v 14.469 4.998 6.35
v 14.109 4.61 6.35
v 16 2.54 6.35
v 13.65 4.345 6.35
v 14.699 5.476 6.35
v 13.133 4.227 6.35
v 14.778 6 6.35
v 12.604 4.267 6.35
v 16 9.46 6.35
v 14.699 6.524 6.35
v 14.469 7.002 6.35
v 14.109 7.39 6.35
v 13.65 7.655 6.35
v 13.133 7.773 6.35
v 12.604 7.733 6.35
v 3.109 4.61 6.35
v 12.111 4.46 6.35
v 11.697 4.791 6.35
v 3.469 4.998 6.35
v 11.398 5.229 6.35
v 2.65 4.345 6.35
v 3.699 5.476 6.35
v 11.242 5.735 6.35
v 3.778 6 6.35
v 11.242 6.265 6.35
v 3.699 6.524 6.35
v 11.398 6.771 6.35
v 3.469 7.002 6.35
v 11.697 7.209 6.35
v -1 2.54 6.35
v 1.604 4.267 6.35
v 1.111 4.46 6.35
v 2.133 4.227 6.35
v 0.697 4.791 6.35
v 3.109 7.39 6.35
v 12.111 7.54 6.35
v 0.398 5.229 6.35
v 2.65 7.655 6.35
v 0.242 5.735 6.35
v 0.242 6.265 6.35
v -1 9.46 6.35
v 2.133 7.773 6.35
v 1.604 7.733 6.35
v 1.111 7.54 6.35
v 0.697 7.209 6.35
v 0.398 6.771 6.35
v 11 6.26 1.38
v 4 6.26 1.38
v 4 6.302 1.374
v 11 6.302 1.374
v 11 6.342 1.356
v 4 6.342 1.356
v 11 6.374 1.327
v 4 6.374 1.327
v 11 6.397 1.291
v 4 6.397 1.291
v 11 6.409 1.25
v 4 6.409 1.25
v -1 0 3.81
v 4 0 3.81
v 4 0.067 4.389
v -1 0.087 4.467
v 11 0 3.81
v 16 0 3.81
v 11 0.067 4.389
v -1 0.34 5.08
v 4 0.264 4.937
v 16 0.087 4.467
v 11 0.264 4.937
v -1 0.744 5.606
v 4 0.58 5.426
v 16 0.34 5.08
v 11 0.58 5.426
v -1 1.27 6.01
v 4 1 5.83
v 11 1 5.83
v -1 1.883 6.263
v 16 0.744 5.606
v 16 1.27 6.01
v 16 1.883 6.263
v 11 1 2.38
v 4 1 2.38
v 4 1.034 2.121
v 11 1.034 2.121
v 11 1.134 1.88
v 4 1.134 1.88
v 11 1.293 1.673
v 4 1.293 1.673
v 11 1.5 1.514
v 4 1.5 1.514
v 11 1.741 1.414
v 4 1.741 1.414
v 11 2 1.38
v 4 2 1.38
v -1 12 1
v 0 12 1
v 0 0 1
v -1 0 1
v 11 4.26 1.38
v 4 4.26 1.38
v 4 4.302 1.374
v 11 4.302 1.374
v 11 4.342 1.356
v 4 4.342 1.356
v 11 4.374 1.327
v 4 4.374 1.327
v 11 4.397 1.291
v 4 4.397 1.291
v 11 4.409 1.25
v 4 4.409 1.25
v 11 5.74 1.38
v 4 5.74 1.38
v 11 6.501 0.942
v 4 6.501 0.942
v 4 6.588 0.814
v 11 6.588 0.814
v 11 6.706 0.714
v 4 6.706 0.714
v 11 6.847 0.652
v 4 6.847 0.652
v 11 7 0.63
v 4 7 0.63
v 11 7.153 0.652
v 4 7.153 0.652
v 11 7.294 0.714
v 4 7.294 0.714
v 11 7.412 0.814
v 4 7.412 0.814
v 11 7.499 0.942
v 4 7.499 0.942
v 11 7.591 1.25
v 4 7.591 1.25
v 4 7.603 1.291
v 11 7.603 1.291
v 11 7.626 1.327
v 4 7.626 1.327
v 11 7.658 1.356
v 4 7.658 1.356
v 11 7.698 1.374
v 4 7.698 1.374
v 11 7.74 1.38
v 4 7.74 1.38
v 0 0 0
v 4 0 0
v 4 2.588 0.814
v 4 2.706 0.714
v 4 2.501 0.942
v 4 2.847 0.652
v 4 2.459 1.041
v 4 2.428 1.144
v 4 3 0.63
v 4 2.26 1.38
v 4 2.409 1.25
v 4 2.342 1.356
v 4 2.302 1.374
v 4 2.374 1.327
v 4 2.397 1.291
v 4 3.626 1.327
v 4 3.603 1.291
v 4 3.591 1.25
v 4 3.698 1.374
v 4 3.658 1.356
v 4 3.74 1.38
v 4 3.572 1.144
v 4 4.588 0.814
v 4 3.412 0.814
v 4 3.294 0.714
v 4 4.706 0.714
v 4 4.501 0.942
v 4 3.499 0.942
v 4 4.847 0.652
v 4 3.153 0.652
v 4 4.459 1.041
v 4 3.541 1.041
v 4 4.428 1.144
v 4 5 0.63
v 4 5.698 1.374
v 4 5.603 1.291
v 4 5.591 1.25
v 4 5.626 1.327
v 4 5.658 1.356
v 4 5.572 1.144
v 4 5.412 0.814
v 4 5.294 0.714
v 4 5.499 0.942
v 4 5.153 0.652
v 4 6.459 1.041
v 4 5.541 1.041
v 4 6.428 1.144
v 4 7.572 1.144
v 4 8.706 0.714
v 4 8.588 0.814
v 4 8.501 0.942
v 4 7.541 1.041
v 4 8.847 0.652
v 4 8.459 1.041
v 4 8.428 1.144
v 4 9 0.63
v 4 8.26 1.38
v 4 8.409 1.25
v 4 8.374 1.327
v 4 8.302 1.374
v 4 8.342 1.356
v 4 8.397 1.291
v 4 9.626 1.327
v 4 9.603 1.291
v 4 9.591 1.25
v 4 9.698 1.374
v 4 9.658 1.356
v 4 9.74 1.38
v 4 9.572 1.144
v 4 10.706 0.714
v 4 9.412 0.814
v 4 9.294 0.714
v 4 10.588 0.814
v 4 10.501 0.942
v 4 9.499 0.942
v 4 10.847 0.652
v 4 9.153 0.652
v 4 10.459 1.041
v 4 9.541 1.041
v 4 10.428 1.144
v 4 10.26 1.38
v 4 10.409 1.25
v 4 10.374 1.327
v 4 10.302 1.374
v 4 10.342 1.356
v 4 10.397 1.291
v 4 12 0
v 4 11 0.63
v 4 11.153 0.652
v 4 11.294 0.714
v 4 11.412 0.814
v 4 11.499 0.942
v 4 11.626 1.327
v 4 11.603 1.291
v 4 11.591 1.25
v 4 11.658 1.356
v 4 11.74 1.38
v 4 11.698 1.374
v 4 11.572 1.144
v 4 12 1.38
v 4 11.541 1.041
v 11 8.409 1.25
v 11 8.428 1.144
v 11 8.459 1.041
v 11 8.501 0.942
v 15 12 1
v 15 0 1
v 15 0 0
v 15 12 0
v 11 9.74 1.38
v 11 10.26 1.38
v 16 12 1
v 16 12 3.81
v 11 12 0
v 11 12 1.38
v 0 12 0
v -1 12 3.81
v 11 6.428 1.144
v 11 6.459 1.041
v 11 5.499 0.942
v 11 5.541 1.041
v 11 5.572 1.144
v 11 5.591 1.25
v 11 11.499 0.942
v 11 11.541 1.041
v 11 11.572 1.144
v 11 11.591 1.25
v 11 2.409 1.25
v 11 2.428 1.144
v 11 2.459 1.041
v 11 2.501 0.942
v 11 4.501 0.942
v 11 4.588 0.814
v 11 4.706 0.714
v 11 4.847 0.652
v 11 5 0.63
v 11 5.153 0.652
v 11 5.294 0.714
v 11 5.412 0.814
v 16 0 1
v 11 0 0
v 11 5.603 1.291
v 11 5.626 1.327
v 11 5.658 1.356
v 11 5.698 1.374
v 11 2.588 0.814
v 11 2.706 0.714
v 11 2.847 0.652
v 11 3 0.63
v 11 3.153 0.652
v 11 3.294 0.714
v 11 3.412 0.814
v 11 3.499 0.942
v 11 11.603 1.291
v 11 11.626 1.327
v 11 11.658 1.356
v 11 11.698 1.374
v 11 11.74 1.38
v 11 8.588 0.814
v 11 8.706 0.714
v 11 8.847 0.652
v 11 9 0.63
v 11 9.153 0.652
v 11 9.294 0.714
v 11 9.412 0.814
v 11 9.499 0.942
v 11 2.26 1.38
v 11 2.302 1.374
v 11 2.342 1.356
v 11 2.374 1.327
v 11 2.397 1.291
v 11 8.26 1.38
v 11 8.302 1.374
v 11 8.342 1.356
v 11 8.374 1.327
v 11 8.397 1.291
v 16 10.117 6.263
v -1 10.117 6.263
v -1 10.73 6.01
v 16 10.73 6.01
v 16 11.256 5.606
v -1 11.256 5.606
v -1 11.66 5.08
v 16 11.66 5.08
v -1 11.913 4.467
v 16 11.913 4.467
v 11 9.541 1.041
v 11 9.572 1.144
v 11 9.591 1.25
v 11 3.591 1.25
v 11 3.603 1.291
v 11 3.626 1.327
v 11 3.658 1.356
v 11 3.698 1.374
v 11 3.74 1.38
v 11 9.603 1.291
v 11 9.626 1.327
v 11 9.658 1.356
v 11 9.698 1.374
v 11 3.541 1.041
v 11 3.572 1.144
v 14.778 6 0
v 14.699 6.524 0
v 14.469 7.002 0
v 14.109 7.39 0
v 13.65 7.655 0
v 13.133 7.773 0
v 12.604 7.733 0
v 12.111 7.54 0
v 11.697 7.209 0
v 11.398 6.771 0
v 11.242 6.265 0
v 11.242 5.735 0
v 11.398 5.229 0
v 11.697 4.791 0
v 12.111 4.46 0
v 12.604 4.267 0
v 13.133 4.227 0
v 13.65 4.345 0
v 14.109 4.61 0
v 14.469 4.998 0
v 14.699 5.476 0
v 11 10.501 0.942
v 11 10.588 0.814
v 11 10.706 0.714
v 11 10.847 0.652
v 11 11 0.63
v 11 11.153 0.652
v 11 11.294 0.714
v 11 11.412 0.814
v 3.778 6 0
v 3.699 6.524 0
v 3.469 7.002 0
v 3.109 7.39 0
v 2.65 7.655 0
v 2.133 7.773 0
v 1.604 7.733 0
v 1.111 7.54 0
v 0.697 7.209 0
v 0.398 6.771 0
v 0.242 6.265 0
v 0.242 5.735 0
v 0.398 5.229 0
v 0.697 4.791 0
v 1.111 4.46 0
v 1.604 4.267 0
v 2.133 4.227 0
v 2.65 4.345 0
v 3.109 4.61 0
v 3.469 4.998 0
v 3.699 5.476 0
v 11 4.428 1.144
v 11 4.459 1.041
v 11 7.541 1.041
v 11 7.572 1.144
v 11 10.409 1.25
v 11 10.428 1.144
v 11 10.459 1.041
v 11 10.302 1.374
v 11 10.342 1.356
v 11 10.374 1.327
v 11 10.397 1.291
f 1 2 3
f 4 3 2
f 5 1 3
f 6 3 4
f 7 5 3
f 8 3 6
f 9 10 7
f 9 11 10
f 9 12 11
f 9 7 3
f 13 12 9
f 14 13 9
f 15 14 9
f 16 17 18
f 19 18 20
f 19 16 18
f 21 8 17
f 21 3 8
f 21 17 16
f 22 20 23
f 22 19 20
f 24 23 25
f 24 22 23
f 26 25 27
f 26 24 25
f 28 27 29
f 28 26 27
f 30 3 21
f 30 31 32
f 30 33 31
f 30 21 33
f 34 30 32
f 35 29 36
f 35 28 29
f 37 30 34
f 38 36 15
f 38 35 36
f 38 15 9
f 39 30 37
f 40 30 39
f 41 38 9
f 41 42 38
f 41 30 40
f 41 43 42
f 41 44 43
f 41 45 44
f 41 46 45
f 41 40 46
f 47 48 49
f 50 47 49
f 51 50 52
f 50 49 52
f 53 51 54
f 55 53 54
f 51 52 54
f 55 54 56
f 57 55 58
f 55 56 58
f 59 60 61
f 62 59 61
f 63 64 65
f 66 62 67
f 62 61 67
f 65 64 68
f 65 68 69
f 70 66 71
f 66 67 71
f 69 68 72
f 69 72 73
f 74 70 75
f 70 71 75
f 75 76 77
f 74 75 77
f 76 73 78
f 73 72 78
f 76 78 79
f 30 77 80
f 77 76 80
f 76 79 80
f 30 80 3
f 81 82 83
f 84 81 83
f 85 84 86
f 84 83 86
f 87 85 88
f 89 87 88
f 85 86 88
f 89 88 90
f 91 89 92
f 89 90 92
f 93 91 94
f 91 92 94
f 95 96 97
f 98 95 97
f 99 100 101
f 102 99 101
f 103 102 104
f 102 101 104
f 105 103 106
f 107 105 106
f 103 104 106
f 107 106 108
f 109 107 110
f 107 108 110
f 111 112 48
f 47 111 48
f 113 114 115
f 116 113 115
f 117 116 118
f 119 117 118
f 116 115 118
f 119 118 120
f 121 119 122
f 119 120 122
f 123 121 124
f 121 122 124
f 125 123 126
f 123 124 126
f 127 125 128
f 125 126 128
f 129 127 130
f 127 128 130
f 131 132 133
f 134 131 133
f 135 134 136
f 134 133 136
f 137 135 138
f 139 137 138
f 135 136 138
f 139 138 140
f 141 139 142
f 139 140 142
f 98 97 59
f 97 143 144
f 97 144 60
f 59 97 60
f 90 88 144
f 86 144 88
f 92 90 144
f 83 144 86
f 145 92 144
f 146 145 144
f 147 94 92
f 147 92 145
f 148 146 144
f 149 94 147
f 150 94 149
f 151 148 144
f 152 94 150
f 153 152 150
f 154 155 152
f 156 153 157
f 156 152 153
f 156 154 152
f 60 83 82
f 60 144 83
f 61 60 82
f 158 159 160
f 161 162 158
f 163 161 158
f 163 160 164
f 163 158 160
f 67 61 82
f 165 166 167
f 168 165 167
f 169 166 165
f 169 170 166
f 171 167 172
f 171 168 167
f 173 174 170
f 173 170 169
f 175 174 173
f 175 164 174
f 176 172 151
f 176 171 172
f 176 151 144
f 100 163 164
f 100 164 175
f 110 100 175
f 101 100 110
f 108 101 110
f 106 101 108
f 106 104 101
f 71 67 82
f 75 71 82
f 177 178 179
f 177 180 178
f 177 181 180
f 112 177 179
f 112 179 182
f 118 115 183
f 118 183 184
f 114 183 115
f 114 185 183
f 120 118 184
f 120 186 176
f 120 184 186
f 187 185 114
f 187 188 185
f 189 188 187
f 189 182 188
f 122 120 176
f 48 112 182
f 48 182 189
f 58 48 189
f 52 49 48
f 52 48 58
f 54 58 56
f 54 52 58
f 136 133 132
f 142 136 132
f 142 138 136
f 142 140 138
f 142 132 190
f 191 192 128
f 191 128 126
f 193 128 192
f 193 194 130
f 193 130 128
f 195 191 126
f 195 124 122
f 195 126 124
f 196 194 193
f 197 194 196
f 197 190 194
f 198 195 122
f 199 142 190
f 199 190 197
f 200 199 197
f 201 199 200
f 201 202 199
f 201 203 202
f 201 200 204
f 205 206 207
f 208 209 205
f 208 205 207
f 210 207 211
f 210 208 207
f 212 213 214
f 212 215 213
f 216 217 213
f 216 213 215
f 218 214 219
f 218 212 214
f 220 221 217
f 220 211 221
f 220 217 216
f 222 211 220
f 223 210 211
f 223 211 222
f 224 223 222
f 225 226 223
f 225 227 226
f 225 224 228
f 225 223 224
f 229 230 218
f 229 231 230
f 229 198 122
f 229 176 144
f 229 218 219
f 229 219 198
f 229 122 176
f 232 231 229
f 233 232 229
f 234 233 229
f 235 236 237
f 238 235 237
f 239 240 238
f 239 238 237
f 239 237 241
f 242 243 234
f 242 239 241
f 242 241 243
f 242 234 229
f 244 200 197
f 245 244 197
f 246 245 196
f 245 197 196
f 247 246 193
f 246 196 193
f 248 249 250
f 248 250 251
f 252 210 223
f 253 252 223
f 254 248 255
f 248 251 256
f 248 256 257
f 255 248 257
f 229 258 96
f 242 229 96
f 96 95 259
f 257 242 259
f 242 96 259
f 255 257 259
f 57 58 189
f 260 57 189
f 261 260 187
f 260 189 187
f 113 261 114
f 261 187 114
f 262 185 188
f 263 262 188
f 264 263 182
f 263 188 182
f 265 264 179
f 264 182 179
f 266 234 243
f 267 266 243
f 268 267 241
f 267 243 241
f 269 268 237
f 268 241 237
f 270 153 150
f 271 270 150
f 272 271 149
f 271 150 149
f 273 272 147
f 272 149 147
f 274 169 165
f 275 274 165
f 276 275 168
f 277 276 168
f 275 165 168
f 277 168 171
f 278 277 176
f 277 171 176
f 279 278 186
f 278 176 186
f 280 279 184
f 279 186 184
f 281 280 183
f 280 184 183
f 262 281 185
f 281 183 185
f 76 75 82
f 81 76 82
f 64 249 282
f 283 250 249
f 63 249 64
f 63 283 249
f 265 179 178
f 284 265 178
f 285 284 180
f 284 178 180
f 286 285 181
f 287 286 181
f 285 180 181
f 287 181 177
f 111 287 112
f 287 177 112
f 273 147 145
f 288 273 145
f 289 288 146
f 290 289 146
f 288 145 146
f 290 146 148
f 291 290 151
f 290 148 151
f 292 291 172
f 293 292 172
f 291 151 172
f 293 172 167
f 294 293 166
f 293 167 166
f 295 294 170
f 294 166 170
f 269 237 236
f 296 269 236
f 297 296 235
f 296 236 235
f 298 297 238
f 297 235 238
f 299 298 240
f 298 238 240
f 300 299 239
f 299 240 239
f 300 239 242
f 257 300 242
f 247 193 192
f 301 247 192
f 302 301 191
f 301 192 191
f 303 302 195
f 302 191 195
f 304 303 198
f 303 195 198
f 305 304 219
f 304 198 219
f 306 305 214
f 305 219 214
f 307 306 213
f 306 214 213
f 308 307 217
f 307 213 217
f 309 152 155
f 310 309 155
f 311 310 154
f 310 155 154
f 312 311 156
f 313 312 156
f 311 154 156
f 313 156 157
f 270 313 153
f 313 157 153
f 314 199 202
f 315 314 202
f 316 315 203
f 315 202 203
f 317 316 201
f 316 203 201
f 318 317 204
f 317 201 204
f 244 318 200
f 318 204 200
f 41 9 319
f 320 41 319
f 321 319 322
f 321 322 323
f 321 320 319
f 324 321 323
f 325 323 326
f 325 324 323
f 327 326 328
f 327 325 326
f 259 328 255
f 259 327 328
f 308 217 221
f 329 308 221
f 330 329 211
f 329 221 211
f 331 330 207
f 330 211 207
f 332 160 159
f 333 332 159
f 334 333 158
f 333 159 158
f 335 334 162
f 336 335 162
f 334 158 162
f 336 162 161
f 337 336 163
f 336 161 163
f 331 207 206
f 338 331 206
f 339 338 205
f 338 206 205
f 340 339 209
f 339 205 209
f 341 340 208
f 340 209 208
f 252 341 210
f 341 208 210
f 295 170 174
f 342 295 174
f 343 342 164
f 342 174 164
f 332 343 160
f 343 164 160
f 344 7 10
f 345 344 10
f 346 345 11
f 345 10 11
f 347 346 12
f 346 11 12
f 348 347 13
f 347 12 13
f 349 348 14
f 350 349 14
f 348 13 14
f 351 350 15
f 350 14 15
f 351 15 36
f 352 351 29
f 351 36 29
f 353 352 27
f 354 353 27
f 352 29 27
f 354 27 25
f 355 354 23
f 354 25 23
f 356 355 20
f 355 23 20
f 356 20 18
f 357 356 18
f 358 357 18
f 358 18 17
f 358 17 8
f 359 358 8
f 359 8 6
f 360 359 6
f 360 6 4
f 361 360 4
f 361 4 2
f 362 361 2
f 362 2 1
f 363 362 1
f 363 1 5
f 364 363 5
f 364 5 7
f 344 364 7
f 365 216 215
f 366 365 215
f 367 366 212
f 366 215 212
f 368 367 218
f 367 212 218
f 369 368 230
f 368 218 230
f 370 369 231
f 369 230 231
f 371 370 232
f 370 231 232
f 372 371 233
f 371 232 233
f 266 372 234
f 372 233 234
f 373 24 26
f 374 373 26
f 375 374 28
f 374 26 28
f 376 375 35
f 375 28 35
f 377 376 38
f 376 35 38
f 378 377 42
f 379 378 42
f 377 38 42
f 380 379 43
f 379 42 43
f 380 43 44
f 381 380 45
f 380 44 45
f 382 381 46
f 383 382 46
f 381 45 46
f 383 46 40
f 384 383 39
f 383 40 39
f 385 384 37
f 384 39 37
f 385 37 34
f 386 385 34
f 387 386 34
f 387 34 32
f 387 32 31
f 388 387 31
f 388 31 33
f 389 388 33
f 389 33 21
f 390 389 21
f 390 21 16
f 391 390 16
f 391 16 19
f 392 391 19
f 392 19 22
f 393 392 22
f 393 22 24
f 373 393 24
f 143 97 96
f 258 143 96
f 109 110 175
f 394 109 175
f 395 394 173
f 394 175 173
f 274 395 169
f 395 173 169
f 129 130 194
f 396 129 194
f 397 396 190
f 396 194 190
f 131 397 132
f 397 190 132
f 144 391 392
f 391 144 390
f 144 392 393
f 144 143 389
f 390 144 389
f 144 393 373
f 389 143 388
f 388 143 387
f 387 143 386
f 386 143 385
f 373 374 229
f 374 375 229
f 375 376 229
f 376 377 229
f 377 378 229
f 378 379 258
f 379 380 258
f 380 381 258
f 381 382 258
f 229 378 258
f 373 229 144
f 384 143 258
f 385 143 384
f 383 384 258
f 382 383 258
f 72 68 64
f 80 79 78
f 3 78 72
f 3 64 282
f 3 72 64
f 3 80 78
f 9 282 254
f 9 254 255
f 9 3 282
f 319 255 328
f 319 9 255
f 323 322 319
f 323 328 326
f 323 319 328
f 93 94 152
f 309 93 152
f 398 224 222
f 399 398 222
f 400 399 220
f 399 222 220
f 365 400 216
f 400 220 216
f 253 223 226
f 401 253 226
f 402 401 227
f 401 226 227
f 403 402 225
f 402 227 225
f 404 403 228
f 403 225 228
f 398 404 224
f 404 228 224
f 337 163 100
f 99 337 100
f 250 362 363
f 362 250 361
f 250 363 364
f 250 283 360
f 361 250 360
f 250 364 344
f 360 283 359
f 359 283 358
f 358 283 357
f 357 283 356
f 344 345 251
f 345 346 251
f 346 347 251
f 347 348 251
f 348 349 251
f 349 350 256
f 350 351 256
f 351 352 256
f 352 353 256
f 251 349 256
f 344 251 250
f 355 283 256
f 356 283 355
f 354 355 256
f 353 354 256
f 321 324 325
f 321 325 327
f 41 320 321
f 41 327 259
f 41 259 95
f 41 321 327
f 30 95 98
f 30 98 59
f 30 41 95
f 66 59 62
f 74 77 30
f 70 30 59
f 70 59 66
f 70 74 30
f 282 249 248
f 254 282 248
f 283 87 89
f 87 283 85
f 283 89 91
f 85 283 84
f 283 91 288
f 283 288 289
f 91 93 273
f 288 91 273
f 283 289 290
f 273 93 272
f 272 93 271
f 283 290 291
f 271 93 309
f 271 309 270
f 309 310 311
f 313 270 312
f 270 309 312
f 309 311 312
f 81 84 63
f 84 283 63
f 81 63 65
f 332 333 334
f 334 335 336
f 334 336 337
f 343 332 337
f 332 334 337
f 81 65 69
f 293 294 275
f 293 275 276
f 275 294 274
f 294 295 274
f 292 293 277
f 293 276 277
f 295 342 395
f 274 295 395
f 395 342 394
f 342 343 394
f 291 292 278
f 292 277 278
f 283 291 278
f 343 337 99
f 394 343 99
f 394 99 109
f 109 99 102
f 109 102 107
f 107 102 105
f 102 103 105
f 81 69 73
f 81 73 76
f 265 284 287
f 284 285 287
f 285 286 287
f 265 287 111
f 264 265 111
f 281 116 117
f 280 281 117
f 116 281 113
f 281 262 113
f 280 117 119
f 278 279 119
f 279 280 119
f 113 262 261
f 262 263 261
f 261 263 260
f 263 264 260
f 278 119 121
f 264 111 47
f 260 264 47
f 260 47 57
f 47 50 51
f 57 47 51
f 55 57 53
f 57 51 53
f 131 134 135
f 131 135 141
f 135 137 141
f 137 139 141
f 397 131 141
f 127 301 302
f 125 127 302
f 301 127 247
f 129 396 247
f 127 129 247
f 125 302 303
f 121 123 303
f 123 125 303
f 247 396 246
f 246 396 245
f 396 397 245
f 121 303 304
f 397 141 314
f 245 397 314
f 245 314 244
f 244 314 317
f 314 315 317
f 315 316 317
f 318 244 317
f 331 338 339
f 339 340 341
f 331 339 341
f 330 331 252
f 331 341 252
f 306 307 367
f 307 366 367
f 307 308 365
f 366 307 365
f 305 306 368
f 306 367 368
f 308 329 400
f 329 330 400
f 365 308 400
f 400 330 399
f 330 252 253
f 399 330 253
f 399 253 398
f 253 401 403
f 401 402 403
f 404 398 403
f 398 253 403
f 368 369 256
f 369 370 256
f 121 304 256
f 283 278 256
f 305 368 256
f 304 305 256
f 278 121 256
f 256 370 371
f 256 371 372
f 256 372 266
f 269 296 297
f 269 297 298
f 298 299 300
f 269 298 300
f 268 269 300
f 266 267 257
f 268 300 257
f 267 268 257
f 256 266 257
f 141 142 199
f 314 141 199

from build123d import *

# Parameters (mm, degrees)
F0_W      = 12
F0_H      = 6.35
F1_DEPTH  = 4
F3_DEPTH  = 7
F4_W      = 12
F4_H      = 6.35
F5_DEPTH  = 4
F6_R      = 1.778
F7_DEPTH  = 25.4
F8_W      = 12
F8_H      = 5.35
F9_DEPTH  = 1
F10_W     = 12
F10_H     = 5.35
F11_DEPTH = 1
F12_F1_R  = 2.54
F12_F2_R  = 2.54


with BuildPart() as f1:
    # F0 (on Right) → F1 (new body)
    with BuildSketch(Plane.YZ):
        with Locations((6, 3.175)):
            Rectangle(F0_W, F0_H)
    extrude(amount=F1_DEPTH)

    # F2 (on face) → F3 (join)
    with BuildSketch(Plane.YZ.offset(4)):
        with BuildLine():
            ThreePointArc((10.2598245749, 1.38), (10.3587316459, 1.3427714117), (10.4085431086, 1.2495652174))
            ThreePointArc((10.4085431086, 1.2495652174), (10.4423882857, 1.091937846), (10.5011235955, 0.9417977528))
            ThreePointArc((10.5011235955, 0.9417977528), (11, 0.63), (11.4988764045, 0.9417977528))
            ThreePointArc((11.4988764045, 0.9417977528), (11.5576117143, 1.091937846), (11.5914568914, 1.2495652174))
            ThreePointArc((11.5914568914, 1.2495652174), (11.6412683541, 1.3427714117), (11.7401754251, 1.38))
            Line((11.7401754251, 1.38), (12, 1.38))
            Line((12, 1.38), (12, 6.35))
            Line((12, 6.35), (1, 6.35))
            Line((1, 6.35), (1, 2.38))
            ThreePointArc((1, 2.38), (1.2928932188, 1.6728932188), (2, 1.38))
            Line((2, 1.38), (2.2598245749, 1.38))
            ThreePointArc((2.2598245749, 1.38), (2.3587316459, 1.3427714117), (2.4085431086, 1.2495652174))
            ThreePointArc((2.4085431086, 1.2495652174), (2.4423882857, 1.091937846), (2.5011235955, 0.9417977528))
            ThreePointArc((2.5011235955, 0.9417977528), (3, 0.63), (3.4988764045, 0.9417977528))
            ThreePointArc((3.4988764045, 0.9417977528), (3.5576117143, 1.091937846), (3.5914568914, 1.2495652174))
            ThreePointArc((3.5914568914, 1.2495652174), (3.6412683541, 1.3427714117), (3.7401754251, 1.38))
            Line((3.7401754251, 1.38), (4, 1.38))
            Line((4, 1.38), (4.2598245749, 1.38))
            ThreePointArc((4.2598245749, 1.38), (4.3587316459, 1.3427714117), (4.4085431086, 1.2495652174))
            ThreePointArc((4.4085431086, 1.2495652174), (4.4423882857, 1.091937846), (4.5011235955, 0.9417977528))
            ThreePointArc((4.5011235955, 0.9417977528), (5, 0.63), (5.4988764045, 0.9417977528))
            ThreePointArc((5.4988764045, 0.9417977528), (5.5576117143, 1.091937846), (5.5914568914, 1.2495652174))
            ThreePointArc((5.5914568914, 1.2495652174), (5.6412683541, 1.3427714117), (5.7401754251, 1.38))
            Line((5.7401754251, 1.38), (6, 1.38))
            Line((6, 1.38), (6.2598245749, 1.38))
            ThreePointArc((6.2598245749, 1.38), (6.3587316459, 1.3427714117), (6.4085431086, 1.2495652174))
            ThreePointArc((6.4085431086, 1.2495652174), (6.4423882857, 1.091937846), (6.5011235955, 0.9417977528))
            ThreePointArc((6.5011235955, 0.9417977528), (7, 0.63), (7.4988764045, 0.9417977528))
            ThreePointArc((7.4988764045, 0.9417977528), (7.5576117143, 1.091937846), (7.5914568914, 1.2495652174))
            ThreePointArc((7.5914568914, 1.2495652174), (7.6412683541, 1.3427714117), (7.7401754251, 1.38))
            Line((7.7401754251, 1.38), (8, 1.38))
            Line((8, 1.38), (8.2598245749, 1.38))
            ThreePointArc((8.2598245749, 1.38), (8.3587316459, 1.3427714117), (8.4085431086, 1.2495652174))
            ThreePointArc((8.4085431086, 1.2495652174), (8.4423882857, 1.091937846), (8.5011235955, 0.9417977528))
            ThreePointArc((8.5011235955, 0.9417977528), (9, 0.63), (9.4988764045, 0.9417977528))
            ThreePointArc((9.4988764045, 0.9417977528), (9.5576117143, 1.091937846), (9.5914568914, 1.2495652174))
            ThreePointArc((9.5914568914, 1.2495652174), (9.6412683541, 1.3427714117), (9.7401754251, 1.38))
            Line((9.7401754251, 1.38), (10, 1.38))
            Line((10, 1.38), (10.2598245749, 1.38))
        make_face()
    extrude(amount=F3_DEPTH)

    # F4 (on face) → F5 (join)
    with BuildSketch(Plane.YZ.offset(11)):
        with Locations((6, 3.175)):
            Rectangle(F4_W, F4_H)
    extrude(amount=F5_DEPTH)

    # F6 (on face) → F7 (cut)
    with BuildSketch(Plane.XY.offset(6.35)):
        with Locations((2, 6)):
            Circle(F6_R)
        with Locations((13, 6)):
            Circle(F6_R)
    extrude(amount=-F7_DEPTH, mode=Mode.SUBTRACT)

    # F8 (on face) → F9 (join)
    with BuildSketch(Plane(origin=(0, 0, 0), x_dir=(0, -1, 0), z_dir=(-1, 0, 0))):
        with Locations((-6, 3.675)):
            Rectangle(F8_W, F8_H)
    extrude(amount=F9_DEPTH)

    # F10 (on face) → F11 (join)
    with BuildSketch(Plane.YZ.offset(15)):
        with Locations((6, 3.675)):
            Rectangle(F10_W, F10_H)
    extrude(amount=F11_DEPTH)

    # F12: fillet of radius 2.54 on 3 edges, made by hand

    # F12_f1
    f12_f1_edges = [f1.edges().sort_by_distance(p)[0] for p in [
        (1.5, 0, 6.35),
    ]]
    fillet(f12_f1_edges, radius=F12_F1_R)

    # F12_f2
    f12_f2_edges = [f1.edges().sort_by_distance(p)[0] for p in [
        (7.5, 12, 6.35),
    ]]
    fillet(f12_f2_edges, radius=F12_F2_R)


solid = f1.part
